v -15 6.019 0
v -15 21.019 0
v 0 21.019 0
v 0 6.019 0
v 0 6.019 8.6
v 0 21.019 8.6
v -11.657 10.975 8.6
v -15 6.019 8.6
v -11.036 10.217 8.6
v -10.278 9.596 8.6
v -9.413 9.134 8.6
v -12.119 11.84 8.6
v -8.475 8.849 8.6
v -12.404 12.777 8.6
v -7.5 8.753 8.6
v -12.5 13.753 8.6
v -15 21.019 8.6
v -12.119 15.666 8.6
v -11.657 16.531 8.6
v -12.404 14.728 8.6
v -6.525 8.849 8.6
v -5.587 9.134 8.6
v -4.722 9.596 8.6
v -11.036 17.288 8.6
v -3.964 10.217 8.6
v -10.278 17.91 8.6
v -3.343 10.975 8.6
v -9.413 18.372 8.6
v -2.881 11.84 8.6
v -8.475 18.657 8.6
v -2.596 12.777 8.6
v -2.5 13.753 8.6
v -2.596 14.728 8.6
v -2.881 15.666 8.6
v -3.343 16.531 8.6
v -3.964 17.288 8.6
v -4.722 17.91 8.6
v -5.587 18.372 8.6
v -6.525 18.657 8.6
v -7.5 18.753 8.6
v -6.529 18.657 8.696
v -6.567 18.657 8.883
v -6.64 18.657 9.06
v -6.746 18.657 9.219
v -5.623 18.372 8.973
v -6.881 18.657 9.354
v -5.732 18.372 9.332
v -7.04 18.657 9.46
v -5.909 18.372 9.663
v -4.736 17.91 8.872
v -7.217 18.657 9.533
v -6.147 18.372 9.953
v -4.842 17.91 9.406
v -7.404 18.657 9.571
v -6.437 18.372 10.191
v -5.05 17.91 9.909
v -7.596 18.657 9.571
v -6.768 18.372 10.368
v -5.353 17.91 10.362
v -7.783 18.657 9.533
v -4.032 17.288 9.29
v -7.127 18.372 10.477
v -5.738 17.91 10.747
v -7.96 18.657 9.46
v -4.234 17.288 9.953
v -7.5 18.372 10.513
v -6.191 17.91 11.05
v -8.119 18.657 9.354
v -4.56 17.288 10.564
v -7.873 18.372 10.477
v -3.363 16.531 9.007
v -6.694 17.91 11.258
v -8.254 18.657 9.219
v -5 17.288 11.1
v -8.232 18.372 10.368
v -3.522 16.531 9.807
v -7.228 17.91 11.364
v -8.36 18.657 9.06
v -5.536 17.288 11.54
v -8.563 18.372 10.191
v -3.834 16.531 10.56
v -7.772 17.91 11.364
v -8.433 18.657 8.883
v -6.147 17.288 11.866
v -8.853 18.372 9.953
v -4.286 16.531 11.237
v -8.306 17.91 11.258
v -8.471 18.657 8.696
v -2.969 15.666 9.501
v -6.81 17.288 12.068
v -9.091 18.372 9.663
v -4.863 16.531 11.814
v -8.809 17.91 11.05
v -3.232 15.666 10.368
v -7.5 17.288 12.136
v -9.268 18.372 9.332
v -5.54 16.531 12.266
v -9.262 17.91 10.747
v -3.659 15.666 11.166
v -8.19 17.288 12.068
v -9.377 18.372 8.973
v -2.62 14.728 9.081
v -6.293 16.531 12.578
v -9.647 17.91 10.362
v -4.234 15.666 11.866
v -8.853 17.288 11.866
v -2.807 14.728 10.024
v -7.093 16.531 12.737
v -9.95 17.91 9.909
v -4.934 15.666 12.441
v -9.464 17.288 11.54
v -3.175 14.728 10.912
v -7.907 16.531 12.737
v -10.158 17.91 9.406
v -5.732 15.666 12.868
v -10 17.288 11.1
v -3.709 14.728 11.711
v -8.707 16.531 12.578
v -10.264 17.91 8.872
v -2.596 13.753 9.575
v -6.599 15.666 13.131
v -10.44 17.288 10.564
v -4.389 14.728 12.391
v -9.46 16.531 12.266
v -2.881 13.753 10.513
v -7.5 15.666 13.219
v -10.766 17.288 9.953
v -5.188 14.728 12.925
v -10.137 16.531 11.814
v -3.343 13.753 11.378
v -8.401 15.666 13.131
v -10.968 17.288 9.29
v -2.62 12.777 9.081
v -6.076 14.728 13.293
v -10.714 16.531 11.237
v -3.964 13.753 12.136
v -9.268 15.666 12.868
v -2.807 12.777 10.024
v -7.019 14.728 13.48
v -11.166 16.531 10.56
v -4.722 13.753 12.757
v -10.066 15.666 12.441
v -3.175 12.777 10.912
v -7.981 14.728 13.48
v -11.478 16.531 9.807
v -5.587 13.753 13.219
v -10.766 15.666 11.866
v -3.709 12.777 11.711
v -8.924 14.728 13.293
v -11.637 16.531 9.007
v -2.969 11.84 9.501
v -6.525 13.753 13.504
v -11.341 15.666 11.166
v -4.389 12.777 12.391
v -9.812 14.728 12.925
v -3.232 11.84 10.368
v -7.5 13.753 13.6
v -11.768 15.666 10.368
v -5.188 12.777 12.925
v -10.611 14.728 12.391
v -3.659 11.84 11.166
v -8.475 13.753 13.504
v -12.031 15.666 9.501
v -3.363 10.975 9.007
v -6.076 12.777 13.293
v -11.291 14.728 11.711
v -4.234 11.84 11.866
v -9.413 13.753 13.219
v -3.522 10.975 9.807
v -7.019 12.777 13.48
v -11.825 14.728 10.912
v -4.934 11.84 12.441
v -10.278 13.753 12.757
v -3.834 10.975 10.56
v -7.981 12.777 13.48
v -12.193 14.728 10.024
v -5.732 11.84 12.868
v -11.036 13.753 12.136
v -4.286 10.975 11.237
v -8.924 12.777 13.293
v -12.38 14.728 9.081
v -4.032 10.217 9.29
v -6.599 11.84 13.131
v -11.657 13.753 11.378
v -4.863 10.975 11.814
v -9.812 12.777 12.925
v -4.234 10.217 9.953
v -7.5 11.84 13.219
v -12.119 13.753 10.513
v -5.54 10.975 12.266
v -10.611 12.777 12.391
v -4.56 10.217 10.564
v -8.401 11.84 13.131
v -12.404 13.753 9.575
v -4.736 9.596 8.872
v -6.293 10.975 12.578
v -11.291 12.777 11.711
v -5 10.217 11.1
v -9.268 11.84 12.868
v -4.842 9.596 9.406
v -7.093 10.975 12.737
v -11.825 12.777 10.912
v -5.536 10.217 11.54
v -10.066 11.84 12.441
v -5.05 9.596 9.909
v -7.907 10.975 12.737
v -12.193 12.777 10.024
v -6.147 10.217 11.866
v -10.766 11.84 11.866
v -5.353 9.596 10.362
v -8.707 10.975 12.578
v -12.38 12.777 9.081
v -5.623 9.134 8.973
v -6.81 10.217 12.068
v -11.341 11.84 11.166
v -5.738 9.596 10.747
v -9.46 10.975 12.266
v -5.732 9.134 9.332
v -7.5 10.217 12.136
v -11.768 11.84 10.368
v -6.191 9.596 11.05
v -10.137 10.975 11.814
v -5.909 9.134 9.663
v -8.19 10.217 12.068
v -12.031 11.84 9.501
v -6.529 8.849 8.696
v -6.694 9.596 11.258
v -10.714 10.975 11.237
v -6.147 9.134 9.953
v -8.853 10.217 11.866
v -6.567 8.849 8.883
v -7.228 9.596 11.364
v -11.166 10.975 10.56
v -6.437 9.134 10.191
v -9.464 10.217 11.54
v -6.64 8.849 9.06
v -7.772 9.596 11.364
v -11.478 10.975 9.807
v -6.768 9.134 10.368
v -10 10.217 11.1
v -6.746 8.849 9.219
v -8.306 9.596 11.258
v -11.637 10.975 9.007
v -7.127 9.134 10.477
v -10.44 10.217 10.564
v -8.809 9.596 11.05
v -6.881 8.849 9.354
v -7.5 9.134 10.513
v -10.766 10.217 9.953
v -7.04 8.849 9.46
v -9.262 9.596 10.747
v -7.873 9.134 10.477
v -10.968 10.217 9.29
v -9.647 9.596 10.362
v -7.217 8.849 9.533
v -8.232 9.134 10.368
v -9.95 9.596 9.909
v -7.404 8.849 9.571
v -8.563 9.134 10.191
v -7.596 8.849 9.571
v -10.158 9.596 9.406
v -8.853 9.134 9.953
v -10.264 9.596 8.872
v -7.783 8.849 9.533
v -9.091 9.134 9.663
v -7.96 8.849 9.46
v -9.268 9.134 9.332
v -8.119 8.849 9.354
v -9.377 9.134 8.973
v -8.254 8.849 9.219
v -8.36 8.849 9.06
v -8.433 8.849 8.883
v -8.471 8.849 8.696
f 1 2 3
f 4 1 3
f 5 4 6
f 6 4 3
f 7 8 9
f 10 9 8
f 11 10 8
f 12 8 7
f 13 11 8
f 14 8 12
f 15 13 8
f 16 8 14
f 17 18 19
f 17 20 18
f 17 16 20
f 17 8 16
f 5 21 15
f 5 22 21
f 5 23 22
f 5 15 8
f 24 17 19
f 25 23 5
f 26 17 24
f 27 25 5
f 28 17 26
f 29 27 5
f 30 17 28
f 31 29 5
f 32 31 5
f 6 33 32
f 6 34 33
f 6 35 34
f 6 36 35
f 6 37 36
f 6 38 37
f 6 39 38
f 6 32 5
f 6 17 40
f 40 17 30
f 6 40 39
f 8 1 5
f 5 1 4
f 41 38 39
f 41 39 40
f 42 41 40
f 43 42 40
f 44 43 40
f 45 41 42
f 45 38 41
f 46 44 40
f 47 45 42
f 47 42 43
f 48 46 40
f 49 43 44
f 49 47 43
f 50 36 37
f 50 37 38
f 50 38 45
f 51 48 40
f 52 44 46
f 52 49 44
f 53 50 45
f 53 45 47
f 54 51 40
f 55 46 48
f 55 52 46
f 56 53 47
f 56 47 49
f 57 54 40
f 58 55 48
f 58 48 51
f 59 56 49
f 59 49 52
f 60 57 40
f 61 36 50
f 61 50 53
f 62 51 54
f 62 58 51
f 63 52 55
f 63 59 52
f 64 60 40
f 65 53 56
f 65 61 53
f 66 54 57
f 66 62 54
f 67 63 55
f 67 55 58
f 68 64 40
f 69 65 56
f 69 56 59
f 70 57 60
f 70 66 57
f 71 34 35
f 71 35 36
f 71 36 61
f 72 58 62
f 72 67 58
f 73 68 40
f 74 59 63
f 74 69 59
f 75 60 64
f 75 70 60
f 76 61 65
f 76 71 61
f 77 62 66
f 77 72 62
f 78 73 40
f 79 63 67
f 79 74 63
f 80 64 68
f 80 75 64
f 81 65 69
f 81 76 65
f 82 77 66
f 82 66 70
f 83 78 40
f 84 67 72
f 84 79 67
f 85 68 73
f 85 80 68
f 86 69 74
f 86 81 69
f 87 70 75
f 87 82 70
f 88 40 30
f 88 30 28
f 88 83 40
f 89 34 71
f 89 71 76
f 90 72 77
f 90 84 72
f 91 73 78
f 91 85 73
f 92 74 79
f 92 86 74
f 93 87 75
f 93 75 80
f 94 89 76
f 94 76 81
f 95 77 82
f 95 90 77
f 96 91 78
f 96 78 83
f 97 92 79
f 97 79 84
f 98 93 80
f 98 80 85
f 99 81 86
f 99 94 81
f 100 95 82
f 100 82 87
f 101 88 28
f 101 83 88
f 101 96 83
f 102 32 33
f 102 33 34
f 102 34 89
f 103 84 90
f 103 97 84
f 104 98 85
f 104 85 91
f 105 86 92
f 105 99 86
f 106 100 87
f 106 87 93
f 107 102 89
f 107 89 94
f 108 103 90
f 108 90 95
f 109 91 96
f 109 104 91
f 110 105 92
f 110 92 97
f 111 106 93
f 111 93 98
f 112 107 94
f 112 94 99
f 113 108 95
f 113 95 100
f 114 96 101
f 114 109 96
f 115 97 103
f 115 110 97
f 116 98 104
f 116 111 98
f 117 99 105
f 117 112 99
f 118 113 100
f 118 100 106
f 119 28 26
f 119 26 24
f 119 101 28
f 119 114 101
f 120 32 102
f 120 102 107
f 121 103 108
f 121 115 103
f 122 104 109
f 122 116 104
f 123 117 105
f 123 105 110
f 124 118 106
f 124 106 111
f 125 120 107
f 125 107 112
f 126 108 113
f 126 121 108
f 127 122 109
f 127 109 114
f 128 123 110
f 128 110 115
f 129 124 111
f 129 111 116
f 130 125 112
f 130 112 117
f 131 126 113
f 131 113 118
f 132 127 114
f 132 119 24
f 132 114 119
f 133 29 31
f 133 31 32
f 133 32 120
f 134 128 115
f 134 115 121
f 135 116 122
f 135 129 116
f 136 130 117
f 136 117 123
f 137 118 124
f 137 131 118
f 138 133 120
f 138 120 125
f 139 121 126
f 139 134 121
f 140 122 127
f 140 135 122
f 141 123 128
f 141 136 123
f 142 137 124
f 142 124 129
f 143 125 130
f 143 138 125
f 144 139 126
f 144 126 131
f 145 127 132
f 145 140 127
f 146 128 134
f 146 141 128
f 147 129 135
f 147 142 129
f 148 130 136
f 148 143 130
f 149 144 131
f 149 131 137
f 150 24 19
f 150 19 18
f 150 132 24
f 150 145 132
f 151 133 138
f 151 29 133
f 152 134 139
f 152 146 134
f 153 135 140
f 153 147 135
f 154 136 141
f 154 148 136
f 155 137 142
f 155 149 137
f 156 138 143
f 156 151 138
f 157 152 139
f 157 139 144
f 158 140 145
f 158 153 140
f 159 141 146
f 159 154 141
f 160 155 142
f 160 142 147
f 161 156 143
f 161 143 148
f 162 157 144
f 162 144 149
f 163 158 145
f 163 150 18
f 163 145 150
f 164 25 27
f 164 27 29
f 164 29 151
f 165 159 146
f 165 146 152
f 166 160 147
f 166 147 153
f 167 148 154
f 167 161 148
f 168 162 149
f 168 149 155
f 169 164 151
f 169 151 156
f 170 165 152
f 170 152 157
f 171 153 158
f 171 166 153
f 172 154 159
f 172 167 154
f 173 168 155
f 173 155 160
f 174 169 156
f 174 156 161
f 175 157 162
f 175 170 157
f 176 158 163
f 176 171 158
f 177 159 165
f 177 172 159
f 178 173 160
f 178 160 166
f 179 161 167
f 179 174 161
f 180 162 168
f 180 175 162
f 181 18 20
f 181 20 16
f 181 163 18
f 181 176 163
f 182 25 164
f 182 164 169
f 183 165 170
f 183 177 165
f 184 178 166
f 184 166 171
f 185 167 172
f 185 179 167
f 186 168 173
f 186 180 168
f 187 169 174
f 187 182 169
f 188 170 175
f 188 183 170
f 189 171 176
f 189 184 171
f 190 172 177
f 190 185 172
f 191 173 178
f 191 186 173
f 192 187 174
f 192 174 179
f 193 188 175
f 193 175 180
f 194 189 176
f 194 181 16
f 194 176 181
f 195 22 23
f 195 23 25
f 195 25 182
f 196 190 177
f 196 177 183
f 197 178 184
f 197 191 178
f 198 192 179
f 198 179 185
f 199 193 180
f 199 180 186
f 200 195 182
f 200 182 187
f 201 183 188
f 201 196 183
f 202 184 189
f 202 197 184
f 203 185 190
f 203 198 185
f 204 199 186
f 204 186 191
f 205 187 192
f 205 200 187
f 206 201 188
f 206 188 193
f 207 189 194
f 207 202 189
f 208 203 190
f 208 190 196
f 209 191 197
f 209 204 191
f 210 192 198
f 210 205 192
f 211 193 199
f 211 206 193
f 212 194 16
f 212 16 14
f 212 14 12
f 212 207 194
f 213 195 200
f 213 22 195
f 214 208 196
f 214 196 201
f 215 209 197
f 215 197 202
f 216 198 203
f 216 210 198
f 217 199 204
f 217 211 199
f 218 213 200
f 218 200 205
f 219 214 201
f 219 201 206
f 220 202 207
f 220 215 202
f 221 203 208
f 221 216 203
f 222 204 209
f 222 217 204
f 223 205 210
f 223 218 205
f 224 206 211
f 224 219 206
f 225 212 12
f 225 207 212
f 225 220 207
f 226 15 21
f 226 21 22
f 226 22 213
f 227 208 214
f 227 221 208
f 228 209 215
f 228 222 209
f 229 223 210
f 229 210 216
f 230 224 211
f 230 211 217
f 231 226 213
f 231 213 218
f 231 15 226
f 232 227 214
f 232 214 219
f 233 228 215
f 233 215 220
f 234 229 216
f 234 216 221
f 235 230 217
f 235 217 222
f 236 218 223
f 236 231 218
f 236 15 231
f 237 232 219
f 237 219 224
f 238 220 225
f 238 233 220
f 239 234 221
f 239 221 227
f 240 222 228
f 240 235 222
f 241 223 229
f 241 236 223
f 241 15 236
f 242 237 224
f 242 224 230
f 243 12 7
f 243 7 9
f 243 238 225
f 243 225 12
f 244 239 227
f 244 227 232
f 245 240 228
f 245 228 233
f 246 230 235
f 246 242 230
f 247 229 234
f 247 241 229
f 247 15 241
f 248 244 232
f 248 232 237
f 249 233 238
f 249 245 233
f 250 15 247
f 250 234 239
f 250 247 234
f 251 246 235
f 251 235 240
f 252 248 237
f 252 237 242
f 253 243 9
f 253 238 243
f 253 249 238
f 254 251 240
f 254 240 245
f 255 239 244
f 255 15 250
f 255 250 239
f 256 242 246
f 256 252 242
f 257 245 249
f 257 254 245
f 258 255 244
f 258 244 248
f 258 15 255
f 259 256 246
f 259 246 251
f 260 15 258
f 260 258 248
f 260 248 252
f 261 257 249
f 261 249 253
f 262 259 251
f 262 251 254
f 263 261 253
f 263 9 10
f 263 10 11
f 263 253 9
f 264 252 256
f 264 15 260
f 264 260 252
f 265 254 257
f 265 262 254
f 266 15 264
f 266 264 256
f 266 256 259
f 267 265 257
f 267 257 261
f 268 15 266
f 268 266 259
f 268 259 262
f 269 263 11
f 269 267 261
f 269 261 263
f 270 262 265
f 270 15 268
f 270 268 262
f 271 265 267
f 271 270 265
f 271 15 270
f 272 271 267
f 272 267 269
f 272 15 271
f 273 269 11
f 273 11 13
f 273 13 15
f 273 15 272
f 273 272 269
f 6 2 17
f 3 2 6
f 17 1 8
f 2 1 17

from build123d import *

# Parameters (mm, degrees)
F0_W     = 15
F0_H     = 15
F1_DEPTH = 8.6


with BuildPart() as f1:
    # F0 (on Top) → F1 (new body)
    with BuildSketch(Plane.XY):
        with Locations((-7.5, 13.519098)):
            Rectangle(F0_W, F0_H)
    extrude(amount=F1_DEPTH)

    # F2 (on face) → F3 (revolve)
    with BuildSketch(Plane.XY.offset(8.6)):
        with BuildLine():
            Line((-7.5, 8.752942), (-7.5, 18.752942))
            ThreePointArc((-7.5, 18.752942), (-12.5, 13.752942), (-7.5, 8.752942))
        make_face()
    revolve(axis=Axis((-7.5, 13.752942, 8.6), (0, -1, 0)))


solid = f1.part
